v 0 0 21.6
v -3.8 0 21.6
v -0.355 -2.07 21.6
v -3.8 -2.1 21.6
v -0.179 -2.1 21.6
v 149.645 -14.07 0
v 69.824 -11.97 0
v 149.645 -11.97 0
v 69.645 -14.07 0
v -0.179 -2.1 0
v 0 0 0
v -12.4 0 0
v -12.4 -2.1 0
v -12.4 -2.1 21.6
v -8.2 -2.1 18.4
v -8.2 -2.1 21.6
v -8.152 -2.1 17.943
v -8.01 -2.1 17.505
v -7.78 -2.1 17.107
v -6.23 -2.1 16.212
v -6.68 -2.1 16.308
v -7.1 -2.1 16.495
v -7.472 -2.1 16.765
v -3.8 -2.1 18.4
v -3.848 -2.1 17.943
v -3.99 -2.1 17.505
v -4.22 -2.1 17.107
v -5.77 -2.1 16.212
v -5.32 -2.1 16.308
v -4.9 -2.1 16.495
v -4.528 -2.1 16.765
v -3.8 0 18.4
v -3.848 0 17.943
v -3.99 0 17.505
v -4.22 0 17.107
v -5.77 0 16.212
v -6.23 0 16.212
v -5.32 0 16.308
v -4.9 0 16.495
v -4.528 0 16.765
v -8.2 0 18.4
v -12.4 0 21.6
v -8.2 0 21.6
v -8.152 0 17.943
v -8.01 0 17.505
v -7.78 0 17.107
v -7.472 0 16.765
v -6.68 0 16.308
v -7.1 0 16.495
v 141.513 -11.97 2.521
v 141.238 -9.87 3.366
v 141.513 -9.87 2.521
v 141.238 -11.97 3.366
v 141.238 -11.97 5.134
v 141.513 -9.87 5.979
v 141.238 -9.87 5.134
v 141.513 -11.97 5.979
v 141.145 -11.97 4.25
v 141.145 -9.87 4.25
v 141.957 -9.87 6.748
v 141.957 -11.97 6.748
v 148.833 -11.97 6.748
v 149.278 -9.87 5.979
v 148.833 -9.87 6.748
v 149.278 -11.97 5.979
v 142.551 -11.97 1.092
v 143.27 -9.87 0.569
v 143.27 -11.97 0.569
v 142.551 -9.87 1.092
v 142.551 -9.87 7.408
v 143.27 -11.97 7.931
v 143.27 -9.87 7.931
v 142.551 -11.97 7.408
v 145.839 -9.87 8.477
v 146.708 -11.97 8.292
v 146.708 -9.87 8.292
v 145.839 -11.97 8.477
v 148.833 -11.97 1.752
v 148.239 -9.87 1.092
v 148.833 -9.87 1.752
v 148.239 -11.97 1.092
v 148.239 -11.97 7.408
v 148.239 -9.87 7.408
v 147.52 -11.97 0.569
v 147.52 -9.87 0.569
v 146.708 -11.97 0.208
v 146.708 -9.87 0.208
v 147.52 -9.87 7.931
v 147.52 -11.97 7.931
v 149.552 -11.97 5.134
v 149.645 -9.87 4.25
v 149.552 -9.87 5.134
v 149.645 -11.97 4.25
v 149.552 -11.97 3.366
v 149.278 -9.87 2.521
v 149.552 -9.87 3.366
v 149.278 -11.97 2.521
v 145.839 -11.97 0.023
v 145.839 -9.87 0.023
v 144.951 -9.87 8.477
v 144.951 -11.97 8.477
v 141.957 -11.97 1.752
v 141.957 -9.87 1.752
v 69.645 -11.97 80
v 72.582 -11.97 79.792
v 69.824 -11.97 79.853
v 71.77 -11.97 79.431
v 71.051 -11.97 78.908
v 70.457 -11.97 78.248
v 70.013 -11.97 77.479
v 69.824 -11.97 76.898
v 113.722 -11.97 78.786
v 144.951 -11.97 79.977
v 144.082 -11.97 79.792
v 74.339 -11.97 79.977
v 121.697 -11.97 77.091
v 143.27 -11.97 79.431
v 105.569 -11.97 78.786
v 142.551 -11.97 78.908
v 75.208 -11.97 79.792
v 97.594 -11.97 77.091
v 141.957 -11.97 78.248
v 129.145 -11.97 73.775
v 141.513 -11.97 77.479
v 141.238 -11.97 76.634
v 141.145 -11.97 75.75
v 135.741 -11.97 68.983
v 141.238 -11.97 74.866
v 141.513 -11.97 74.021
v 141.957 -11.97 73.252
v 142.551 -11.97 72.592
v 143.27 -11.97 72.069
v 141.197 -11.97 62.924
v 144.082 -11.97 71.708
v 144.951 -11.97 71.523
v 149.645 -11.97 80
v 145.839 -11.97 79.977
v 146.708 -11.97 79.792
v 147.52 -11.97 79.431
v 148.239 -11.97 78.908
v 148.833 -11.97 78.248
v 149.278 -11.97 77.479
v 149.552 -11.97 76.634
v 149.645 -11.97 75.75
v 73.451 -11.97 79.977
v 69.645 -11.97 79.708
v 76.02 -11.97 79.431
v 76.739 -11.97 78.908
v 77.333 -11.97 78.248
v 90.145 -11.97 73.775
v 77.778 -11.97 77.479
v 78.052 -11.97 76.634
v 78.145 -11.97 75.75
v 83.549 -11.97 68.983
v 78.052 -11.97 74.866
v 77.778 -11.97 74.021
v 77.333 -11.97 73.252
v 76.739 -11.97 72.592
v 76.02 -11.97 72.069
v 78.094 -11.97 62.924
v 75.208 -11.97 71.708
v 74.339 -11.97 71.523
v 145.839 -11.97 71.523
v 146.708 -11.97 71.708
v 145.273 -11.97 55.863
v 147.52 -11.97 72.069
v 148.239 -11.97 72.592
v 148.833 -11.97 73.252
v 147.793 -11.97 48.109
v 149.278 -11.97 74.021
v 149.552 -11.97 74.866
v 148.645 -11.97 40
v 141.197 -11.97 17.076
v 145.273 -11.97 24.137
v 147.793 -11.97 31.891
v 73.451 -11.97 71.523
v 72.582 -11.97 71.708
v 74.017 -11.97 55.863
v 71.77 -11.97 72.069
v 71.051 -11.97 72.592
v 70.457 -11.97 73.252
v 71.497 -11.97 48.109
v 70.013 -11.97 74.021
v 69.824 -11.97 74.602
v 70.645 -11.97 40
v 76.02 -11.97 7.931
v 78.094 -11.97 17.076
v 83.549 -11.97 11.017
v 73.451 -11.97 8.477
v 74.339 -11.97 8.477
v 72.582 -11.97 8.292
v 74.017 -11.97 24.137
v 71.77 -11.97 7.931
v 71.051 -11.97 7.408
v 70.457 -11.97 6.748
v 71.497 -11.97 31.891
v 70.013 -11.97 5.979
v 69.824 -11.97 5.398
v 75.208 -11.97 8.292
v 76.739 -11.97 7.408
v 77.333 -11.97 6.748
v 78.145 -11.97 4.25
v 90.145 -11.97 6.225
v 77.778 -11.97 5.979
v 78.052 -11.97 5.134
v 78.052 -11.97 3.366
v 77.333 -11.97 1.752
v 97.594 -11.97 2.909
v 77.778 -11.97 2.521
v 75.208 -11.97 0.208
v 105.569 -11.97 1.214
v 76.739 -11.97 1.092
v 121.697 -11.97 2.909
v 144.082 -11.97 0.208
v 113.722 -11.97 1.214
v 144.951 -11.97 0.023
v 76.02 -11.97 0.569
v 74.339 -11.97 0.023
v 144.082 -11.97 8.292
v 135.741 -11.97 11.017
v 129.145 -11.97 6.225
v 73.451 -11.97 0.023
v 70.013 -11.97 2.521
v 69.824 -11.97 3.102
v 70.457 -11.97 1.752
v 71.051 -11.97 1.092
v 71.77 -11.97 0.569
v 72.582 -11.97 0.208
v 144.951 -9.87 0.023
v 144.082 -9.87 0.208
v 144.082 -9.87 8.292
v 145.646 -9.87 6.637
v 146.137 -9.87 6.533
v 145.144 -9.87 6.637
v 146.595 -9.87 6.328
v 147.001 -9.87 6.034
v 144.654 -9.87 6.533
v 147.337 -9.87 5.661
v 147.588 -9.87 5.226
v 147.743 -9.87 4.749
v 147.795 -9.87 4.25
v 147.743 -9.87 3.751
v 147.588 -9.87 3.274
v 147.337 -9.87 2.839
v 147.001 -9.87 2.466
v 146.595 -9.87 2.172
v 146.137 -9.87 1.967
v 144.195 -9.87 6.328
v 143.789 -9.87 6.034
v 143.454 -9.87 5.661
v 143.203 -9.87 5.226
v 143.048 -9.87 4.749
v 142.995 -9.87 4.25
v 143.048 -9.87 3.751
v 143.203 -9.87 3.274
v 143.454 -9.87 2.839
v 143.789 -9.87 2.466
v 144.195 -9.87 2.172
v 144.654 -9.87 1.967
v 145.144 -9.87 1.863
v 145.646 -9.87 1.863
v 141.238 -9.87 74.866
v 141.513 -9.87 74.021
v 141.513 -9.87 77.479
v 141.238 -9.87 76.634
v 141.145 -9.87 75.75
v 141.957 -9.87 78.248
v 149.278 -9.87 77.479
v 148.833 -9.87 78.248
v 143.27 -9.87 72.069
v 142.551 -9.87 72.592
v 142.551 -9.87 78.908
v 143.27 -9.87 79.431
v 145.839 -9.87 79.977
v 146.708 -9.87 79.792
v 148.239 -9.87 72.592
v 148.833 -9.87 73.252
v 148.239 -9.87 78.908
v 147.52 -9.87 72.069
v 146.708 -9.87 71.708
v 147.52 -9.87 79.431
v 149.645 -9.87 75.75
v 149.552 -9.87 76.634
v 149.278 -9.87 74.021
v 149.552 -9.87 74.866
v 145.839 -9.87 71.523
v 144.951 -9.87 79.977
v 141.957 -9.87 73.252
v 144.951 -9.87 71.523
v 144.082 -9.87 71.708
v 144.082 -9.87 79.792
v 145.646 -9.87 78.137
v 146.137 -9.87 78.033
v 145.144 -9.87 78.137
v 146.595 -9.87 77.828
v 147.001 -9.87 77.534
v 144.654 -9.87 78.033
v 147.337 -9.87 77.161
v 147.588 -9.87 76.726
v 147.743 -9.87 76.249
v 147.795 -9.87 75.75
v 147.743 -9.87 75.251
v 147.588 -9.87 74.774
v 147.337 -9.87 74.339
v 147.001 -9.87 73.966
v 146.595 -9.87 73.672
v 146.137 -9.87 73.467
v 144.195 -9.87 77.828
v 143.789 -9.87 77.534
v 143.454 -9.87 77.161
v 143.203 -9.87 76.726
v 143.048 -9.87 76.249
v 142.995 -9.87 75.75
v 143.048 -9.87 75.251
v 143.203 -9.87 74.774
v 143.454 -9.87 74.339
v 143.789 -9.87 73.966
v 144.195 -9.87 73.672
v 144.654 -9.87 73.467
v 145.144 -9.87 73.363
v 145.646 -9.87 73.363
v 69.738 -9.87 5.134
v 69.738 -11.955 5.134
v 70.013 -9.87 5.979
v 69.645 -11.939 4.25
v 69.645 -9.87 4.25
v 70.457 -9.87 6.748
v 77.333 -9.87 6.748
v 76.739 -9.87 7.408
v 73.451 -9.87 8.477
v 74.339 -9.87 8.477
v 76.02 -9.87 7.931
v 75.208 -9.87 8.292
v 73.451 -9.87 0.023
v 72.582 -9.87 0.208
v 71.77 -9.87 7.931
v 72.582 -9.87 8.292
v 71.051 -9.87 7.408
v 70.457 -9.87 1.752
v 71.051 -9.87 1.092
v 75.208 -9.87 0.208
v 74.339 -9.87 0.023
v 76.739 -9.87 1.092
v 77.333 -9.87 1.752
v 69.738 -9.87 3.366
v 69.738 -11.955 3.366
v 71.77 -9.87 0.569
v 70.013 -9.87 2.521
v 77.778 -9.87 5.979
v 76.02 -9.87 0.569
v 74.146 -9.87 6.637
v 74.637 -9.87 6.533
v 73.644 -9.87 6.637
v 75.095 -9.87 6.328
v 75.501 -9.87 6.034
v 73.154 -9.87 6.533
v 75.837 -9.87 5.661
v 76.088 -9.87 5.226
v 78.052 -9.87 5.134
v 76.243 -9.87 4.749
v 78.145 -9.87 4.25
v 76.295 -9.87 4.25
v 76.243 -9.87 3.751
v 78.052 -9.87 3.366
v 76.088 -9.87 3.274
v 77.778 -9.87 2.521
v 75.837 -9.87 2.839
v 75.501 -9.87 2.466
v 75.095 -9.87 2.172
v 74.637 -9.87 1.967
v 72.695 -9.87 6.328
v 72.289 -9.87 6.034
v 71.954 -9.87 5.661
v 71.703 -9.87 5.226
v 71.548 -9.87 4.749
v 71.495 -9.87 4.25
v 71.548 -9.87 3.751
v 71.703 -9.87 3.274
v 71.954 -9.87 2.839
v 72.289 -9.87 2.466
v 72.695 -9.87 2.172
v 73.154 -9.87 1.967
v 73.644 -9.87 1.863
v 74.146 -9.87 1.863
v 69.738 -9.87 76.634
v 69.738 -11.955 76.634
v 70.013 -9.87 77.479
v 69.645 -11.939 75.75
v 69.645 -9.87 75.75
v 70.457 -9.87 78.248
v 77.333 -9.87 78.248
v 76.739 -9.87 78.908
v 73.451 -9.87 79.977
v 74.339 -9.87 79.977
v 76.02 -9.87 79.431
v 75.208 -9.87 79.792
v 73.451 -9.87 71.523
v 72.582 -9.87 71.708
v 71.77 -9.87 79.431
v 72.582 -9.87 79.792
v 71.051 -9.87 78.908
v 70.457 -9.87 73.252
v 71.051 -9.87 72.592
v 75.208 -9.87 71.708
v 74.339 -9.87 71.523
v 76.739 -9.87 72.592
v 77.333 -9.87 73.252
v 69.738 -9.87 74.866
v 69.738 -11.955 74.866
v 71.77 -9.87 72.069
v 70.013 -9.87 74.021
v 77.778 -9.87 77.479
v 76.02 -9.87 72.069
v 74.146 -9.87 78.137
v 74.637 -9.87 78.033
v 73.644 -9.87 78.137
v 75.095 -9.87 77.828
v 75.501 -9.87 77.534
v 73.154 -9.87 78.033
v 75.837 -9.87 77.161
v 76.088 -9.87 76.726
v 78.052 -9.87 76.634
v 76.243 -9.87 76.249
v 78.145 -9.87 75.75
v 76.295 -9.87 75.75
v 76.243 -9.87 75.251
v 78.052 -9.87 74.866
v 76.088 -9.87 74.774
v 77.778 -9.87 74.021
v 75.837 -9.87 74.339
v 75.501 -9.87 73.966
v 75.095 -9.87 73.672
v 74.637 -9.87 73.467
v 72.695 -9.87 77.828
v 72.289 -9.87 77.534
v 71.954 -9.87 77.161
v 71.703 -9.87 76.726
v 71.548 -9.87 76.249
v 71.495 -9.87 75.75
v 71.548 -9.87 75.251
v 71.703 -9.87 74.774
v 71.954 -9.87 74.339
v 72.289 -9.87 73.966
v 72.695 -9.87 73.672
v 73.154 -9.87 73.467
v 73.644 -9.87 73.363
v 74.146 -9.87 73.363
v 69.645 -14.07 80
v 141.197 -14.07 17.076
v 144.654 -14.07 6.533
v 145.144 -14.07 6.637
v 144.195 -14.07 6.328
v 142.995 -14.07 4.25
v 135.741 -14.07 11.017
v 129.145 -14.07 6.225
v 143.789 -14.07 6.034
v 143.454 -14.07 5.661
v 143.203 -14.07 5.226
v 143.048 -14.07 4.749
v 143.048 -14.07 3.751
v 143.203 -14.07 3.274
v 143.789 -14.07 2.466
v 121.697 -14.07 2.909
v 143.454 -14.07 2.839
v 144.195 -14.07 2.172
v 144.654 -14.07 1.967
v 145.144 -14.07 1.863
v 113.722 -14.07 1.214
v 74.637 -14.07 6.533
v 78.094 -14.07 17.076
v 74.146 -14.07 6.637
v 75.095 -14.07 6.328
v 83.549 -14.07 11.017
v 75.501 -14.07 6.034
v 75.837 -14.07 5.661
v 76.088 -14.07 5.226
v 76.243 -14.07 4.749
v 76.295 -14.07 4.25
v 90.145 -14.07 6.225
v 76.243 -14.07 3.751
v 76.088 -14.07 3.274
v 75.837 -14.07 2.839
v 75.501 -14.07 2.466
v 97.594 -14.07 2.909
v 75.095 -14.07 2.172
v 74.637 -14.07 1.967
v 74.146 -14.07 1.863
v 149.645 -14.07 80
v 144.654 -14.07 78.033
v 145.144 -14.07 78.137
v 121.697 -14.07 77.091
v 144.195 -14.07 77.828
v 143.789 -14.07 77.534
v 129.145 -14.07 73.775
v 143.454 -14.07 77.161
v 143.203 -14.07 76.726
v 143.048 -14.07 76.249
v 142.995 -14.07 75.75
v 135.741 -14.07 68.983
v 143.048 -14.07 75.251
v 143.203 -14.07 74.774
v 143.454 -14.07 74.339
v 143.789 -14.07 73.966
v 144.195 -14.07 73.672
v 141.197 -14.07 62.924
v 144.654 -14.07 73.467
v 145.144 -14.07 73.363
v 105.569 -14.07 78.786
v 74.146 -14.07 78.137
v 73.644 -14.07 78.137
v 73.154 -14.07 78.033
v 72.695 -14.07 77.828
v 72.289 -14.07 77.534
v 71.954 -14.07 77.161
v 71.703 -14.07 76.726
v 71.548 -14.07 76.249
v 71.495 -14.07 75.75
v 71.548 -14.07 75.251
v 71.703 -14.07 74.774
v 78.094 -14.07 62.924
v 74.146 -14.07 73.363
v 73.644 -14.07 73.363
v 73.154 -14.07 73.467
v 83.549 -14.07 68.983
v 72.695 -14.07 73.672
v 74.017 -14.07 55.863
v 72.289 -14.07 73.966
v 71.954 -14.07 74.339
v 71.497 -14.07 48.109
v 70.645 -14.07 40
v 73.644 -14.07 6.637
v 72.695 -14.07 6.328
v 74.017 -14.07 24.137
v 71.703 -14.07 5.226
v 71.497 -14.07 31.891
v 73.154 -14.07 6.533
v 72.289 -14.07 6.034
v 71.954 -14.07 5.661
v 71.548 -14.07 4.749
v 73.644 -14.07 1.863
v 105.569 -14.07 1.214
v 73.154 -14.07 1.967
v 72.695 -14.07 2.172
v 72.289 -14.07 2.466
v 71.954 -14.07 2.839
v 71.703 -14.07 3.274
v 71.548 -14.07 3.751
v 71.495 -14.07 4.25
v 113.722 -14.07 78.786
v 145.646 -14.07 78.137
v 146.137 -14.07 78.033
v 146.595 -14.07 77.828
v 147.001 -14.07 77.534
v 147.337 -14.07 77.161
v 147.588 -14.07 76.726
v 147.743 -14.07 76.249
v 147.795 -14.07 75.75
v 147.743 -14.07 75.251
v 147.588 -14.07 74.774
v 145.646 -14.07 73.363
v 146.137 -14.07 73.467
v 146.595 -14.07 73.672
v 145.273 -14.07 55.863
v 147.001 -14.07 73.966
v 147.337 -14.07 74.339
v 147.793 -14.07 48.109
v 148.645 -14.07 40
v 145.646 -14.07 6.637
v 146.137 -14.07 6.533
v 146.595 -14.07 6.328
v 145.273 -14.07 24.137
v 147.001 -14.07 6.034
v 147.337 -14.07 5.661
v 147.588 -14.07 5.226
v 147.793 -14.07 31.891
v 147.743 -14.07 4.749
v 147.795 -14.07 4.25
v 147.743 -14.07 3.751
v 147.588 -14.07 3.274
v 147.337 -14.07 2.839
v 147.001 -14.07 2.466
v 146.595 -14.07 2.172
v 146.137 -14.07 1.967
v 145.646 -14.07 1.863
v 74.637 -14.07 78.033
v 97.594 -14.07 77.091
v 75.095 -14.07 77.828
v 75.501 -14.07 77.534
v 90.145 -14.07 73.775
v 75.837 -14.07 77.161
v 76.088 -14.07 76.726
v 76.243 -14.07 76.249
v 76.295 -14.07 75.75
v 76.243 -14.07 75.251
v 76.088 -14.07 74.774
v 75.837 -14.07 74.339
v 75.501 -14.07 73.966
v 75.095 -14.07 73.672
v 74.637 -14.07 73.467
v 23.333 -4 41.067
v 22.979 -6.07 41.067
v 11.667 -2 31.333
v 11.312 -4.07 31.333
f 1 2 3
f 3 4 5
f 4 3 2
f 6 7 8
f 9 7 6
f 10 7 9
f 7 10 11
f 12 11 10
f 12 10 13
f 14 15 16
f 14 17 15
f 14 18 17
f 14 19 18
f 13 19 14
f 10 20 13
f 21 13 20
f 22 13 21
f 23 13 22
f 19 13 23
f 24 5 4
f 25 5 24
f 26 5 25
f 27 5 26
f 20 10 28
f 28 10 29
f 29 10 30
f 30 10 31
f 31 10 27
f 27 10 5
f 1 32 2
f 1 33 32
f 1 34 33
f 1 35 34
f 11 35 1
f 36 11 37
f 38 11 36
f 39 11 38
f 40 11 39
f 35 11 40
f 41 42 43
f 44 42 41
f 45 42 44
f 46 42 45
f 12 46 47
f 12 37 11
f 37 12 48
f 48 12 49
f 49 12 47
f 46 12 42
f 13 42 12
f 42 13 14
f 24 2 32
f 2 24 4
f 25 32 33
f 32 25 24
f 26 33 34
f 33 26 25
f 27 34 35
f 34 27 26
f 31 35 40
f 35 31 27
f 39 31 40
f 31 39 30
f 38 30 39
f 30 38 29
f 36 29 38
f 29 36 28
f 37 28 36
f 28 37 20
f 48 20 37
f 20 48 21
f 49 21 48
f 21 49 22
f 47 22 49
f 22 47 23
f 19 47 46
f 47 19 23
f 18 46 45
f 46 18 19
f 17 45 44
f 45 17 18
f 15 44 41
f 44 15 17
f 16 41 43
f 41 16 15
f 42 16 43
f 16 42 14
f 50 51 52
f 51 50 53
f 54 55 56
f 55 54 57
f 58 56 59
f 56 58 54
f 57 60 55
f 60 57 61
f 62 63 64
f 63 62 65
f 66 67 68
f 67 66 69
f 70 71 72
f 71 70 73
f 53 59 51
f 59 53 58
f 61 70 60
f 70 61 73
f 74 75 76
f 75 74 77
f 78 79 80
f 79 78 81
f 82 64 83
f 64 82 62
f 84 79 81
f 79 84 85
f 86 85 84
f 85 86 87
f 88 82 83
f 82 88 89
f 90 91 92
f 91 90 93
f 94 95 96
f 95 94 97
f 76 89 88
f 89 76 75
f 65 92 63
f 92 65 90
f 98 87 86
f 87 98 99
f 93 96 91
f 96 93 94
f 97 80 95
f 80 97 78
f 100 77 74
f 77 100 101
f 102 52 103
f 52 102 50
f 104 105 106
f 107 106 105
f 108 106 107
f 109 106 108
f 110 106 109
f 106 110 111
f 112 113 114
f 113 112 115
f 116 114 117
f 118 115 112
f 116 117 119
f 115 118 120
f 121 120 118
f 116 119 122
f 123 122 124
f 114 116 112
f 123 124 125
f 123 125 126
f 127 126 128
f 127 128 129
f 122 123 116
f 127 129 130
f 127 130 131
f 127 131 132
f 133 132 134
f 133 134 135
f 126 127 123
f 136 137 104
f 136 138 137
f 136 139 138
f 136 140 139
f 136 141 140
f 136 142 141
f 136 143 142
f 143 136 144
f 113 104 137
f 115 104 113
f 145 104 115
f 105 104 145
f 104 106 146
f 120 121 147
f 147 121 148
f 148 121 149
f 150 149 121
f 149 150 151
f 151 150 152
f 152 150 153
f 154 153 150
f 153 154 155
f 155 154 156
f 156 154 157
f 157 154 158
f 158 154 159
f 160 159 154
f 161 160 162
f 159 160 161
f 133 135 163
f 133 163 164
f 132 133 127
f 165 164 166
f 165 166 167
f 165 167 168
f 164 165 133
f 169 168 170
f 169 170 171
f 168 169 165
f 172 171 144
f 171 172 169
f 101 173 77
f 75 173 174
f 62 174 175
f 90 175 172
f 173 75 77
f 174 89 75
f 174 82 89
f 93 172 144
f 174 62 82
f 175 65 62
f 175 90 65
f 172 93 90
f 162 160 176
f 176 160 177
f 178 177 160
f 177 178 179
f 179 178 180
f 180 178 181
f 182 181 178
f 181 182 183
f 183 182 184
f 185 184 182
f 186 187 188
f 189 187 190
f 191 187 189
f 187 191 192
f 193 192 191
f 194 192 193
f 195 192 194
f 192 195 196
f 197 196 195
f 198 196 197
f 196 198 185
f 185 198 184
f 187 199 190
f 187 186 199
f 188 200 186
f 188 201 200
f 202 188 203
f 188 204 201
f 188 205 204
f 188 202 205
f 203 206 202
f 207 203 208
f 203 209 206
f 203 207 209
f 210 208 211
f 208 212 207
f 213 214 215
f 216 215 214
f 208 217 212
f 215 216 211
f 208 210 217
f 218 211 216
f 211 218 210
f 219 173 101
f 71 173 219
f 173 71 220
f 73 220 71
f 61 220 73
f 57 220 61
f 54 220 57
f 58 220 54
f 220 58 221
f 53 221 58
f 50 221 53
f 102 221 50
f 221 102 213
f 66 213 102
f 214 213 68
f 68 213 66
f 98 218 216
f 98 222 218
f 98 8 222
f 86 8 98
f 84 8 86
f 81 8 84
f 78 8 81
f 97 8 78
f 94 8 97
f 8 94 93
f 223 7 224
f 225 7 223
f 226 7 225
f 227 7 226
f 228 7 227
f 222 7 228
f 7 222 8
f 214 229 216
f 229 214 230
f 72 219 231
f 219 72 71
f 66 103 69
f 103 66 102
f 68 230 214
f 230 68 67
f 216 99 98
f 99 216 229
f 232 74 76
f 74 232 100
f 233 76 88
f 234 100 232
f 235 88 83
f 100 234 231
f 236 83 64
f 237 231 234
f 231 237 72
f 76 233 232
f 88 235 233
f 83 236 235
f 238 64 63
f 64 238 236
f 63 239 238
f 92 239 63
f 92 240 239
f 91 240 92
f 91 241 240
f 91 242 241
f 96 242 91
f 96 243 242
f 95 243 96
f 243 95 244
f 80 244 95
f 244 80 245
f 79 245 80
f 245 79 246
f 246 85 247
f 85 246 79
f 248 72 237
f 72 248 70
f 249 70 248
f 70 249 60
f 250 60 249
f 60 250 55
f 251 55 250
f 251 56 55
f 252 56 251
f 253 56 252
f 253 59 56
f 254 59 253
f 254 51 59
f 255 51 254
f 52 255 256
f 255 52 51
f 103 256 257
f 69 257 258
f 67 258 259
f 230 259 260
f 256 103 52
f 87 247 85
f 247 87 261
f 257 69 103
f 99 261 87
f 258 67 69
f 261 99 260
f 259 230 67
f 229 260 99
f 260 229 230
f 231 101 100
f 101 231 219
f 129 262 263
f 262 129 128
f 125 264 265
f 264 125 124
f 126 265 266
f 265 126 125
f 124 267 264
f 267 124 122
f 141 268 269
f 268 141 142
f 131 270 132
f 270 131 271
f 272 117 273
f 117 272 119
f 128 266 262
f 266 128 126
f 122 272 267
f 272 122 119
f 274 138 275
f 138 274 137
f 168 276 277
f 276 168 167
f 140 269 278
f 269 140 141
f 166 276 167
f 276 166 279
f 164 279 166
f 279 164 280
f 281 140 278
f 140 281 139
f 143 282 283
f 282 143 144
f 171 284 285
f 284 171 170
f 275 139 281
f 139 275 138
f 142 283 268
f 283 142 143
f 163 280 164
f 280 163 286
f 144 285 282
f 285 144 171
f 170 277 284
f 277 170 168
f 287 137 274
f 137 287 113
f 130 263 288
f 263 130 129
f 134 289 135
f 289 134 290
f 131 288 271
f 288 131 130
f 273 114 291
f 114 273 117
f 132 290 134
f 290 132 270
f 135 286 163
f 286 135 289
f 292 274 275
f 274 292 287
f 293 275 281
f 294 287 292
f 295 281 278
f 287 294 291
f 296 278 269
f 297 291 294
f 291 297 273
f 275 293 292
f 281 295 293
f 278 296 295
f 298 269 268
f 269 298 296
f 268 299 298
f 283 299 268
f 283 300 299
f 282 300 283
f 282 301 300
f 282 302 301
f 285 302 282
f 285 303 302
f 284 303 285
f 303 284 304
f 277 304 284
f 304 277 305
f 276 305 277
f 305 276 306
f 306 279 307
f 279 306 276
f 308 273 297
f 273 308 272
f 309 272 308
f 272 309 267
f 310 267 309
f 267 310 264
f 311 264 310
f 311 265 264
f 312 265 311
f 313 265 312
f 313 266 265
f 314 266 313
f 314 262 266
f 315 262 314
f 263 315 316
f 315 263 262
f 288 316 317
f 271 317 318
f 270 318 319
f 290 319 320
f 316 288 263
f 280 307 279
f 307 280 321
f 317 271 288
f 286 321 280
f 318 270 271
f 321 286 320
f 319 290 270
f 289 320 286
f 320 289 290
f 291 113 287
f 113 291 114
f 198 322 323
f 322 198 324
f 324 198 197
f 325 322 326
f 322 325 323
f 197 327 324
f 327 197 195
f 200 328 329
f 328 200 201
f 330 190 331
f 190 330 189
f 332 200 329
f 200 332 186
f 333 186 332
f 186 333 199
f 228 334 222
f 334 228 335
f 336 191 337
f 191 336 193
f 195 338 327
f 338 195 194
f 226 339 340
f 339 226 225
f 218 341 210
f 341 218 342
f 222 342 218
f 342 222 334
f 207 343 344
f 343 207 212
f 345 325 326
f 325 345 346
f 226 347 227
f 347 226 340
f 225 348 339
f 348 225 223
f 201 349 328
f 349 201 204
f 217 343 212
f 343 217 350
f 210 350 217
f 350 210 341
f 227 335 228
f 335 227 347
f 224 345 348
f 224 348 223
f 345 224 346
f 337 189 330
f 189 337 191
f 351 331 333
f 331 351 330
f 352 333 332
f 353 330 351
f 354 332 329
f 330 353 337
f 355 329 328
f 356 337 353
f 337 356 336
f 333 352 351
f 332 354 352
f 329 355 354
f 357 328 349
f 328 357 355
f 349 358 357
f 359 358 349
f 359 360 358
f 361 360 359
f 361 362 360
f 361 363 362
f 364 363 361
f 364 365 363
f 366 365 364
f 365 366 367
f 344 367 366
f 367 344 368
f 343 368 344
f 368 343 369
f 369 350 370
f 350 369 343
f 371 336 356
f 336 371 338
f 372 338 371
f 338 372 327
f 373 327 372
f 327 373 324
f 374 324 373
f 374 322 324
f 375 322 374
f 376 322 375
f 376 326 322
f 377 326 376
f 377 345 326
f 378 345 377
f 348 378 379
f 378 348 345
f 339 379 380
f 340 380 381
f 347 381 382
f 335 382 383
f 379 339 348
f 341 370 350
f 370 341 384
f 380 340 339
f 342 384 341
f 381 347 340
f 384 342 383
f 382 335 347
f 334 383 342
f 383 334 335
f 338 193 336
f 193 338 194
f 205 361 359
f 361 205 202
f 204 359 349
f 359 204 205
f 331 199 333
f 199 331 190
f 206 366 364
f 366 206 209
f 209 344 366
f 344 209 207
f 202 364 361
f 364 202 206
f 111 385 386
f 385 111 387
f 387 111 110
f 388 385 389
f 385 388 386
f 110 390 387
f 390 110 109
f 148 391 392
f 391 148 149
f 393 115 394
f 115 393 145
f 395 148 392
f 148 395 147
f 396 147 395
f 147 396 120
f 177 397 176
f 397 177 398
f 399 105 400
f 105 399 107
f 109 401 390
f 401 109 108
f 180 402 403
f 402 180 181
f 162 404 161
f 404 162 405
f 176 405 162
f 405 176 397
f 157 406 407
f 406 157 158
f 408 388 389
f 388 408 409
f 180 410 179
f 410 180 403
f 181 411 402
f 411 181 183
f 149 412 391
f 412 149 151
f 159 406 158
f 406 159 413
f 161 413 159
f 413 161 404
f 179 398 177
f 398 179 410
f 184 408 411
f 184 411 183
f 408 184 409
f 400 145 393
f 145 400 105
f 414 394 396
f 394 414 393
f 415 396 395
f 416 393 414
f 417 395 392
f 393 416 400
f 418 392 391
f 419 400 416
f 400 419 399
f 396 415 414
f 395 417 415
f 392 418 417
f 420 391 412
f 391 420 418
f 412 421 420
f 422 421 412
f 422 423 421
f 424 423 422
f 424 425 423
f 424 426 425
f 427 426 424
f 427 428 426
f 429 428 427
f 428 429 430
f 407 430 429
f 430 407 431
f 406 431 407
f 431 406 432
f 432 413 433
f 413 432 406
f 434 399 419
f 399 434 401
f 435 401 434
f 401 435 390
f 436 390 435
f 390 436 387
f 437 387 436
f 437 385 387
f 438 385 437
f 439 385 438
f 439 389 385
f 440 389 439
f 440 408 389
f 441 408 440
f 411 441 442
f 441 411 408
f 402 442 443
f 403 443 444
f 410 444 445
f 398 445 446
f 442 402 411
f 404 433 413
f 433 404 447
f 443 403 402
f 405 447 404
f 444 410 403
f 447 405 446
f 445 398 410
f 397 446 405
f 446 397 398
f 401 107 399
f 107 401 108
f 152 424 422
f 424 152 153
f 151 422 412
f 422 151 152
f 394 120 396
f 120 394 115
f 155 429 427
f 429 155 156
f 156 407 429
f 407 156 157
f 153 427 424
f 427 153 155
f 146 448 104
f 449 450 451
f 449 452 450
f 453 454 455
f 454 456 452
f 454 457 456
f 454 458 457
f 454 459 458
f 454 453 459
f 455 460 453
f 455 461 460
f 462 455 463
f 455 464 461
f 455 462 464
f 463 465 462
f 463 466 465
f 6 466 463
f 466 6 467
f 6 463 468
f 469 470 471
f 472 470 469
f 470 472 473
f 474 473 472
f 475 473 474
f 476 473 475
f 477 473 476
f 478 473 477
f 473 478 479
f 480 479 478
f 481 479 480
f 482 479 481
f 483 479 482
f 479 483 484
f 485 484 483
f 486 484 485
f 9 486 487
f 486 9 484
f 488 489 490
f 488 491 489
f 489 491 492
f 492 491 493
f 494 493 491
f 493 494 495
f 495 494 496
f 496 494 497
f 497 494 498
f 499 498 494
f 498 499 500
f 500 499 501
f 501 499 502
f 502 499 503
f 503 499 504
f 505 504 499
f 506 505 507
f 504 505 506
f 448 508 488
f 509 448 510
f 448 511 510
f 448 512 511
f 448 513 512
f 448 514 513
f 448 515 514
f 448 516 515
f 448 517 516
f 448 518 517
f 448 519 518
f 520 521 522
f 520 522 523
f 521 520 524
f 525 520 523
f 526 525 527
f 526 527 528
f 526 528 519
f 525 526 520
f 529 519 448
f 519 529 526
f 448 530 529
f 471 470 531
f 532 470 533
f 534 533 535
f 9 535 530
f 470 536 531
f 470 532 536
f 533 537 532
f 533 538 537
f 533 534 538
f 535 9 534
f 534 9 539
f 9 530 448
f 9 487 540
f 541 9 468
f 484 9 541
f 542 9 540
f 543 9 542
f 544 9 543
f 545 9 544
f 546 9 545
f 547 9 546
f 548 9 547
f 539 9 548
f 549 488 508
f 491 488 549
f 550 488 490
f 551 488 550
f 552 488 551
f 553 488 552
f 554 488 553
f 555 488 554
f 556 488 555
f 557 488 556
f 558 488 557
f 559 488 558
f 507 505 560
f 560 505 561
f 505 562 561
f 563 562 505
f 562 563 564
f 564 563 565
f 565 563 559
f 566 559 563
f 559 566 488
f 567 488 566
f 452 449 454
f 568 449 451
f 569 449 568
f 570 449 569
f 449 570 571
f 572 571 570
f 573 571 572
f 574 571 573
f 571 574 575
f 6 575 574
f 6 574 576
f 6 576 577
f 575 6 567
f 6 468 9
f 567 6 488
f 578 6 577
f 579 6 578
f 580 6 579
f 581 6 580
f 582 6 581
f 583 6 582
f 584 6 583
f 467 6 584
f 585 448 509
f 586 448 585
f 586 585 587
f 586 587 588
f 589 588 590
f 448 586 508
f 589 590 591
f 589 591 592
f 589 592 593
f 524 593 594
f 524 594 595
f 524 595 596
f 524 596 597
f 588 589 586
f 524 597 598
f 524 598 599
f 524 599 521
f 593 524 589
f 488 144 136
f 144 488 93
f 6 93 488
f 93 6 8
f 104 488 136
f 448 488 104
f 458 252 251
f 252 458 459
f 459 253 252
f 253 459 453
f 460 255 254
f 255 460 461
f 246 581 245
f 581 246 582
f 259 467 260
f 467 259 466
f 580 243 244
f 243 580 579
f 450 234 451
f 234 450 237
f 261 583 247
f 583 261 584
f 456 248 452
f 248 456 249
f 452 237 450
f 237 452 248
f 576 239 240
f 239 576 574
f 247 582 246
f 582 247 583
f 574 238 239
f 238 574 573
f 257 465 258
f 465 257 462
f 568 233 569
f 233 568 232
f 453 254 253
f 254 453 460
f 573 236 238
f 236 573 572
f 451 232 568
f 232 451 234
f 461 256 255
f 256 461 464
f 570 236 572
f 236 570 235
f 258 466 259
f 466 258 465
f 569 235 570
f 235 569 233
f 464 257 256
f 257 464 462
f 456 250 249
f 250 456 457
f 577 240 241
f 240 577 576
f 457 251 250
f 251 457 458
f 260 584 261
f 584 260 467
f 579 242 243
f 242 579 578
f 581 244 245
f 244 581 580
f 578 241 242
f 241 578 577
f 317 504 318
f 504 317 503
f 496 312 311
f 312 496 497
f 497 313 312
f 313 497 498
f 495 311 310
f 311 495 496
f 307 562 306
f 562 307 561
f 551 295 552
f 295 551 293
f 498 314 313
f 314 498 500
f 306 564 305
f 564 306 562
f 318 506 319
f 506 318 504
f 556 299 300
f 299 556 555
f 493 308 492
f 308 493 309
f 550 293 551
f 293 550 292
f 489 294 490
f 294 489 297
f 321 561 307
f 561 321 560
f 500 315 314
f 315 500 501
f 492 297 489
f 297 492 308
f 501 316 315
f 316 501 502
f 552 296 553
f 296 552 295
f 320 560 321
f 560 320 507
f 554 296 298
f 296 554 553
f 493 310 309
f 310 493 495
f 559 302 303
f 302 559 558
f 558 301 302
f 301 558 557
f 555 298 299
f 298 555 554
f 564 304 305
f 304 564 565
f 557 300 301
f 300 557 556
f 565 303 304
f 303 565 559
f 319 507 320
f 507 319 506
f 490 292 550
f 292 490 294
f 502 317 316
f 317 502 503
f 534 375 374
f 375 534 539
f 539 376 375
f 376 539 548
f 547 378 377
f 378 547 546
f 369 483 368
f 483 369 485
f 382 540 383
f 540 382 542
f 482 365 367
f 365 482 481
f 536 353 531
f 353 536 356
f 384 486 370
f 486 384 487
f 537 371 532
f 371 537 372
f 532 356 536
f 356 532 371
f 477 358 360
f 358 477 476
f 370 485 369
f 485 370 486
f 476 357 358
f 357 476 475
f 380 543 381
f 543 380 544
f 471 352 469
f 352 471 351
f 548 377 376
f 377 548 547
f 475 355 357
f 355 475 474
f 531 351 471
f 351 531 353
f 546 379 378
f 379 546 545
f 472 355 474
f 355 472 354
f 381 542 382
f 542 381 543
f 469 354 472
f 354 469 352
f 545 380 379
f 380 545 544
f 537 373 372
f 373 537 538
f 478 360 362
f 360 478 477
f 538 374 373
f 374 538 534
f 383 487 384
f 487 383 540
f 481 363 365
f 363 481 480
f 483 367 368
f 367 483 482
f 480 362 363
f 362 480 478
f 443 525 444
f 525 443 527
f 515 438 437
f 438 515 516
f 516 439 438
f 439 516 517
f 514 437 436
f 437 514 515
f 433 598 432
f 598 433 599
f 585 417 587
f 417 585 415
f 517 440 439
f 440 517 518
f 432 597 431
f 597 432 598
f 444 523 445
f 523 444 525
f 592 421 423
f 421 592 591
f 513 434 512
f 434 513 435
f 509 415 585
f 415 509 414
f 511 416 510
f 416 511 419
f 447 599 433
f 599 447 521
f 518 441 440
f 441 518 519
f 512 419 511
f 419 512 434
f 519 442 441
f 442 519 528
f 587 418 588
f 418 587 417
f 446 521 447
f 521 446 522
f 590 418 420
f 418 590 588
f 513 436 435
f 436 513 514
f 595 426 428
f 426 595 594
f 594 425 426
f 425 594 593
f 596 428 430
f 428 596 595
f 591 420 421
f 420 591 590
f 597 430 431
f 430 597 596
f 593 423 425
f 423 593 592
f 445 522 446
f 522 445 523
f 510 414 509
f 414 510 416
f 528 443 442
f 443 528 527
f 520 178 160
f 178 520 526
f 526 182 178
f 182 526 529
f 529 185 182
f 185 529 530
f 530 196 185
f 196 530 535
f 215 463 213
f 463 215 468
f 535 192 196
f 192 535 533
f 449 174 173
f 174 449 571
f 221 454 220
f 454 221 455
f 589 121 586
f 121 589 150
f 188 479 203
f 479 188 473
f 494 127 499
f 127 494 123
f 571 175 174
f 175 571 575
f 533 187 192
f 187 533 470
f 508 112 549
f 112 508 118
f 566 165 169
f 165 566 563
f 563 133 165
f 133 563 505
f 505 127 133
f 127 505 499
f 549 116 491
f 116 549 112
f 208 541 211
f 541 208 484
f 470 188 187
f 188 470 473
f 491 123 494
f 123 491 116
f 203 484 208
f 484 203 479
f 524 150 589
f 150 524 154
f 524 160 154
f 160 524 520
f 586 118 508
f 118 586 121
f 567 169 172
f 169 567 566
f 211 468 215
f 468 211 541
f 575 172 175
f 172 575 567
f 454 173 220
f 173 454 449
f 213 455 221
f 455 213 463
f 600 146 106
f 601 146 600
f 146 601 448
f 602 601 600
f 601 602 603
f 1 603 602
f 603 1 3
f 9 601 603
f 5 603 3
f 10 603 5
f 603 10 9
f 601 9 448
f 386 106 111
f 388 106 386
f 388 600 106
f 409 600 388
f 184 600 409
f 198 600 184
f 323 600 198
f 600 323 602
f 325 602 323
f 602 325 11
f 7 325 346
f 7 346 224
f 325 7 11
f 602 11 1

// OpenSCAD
// file: ../finger/finger.scad
// PC case Finger (slot cover)
// Author: JayEye <jayeye@gmail.com>
//
// For the latest version, look in
// https://github.com/jayeye/jum/tree/master/src/scad/finger
//
// The following dimensions are taken from
// http://www.lo-tech.co.uk/w/images/0/0b/RAM-and-EMS-Board-Slot-Bracket-r01.png
// All distances are in millimeters.
//
//
// Body, looking from the outside.
//                                                        B.-----.A
//                                                        /      |
//                                                       /       |
//            D.-------------------//-------------------'C       |
//            /                                                  |
//  F.-------'E                                                  |
//   |                                                           |
//   |                                                           |
//  G`-------.H                                          K.------'L
//            \                                          /
//            I`-------------------//-------------------'J
//
// Horizontal distances:
// AB: 2.8
// AC: 6.1
// AG: 120
// AH: 112.8
// AJ: 8.5
// AK: 5.7
//
// Vertical distances:
// AL: 18.8
// LJ: 2.8
// FG: 10.2
// JD: 18.3

module finger_front() {
  u = (18.3 - 10.2) / 2;

  A = [0, 0];
  B = A + [-2.8, 0];
  L = A + [0, -18.8];
  K = L + [-5.7, 0];
  J = [-8.5, K[1] - 2.8];
  H = [-112.8, J[1] + u];
  I = [H[0] + u, J[1]];
  G = [-120, H[1]];
  F = G + [0, 10.2];
  E = [H[0], F[1]];
  D = [I[0], J[1] + 18.3];
  C = A + [-6.1, D[1]];
  B = A + [-2.8, 0];

  Fa = F + [0, -1]; // chamfer the corners!
  Fb = F + [1, 0];

  Ga = G + [0, 1];
  Gb = G + [1, 0];

  polygon(points=[A, B, C, D, E, Fb, Fa, Ga, Gb, H, I, J, K, L],
          paths=[[0, 1, 2, 3, 4, 5, 6, 7, 8, 9, 10, 11, 12, 13]]);
}


// Tab, looking from above:
//
//  P.------.Q   V.---.M
//   |      |     |   |
//   |      |     |   |
//   |      R  S  T   |
//   |       \___/    |
//   |                |
//   |                |
//   |                |
//   |                |
//  O`----------------'N
//
// 
// Horizontal distances:
// PS: 6.4
// ON: 11.5
// QV: 4.4
//
// Vertical distances:
// MS: 3.2
// MN: 18.8
//
// S is the center of a semicircle.

module finger_top() {
  r = 4.4 / 2;

  M = [0, 0];
  N = M + [0, -18.8];
  O = N + [-11.5, 0];
  P = [O[0], 0];
  S = P + [6.4, -3.2];
  R = S + [-r, 0];
  T = S + [r, 0];
  Q = [R[0], 0];
  V = [T[0], 0];

  difference() {
    polygon(points=[M, N, O, P, Q, R, T, V],
            paths=[[0, 1, 2, 3, 4, 5, 6, 7]]);
    translate(S) circle(r=r);
  }
}

module finger_full(finger_thickness=1) {
  color("cyan")
    linear_extrude(height=finger_thickness) 
      finger_front();
  color("magenta")
    translate([0, 0, finger_thickness])
      rotate(90, [0, 1, 0])
        linear_extrude(height=finger_thickness)
          finger_top();
  color("yellow")
    scale([1, -1, 1])
      cube([finger_thickness, 18.8, finger_thickness]);
}

finger_full();
// main file
$fn=30;
use <../finger/finger.scad>

// Cooling fan for cards, supported from a finger in an empty slot.
// Author: JayEye <jayeye@gmail.com>
//
// For the latest version, look in
// https://github.com/jayeye/jum/tree/master/src/scad/fingerfan

finger_fan_bracket();
module finger_fan_bracket() {
  fan_size = 80;
  fan_hole_distance = 71.5;
  finger_thickness = .9;    // I print at .15 z-resolution, so I want these
  bracket_thickness = 2.1;  // to be multiples of Δz.
  bracket_fan_distance_from_case = 110 - fan_size / 2;
  bracket_fan_distance_from_cards = 12;

  bracket_phi = atan2(bracket_fan_distance_from_cards,
                      bracket_fan_distance_from_case);
  echo(bracket_phi);
  bracket_hypotenuse = sqrt(bracket_fan_distance_from_cards *
                            bracket_fan_distance_from_cards +
                            bracket_fan_distance_from_case * 
                            bracket_fan_distance_from_case);
  finger_full_z = (18.8 + 2.8);  // AL + LJ
  finger_full_x = 11.5;  // NO

    // finger pad
  color("blue") {
    union() {
      translate([-finger_thickness, 0, finger_full_z]) {
        rotate(90, [1, 0, 0]) {
          linear_extrude(height=bracket_thickness) finger_top();
        }
      }
      scale([-1, -1, 1]) {
        cube([finger_thickness, bracket_thickness, finger_full_z]);
        cube([finger_thickness + finger_full_x, bracket_thickness, finger_full_z/2]);
      }
    }
  }  
    // actual bracket
  rotate((90 - bracket_phi)) {
    translate([-bracket_thickness, 0, 0]) {
      rotate(90, [1, 0, 0]) {
        union() {
          color("green") {
            linear_extrude(height=bracket_hypotenuse,
                           scale=[1, fan_size / finger_full_z]) {
              square([ bracket_thickness, finger_full_z]);
            }
          }
          color("red") {
            translate([0, fan_size, bracket_hypotenuse]) {
              rotate(bracket_phi, [0, 1, 0]) {
                translate([0, -fan_size/2, fan_size/2]) {
                  rotate(90, [0, 1, 0]) {
                    fan_frame(frame_thickness=bracket_thickness);
                  }
                }
              }
            }
          }
        }
      }
    }
  }

  // show, but probably don't print, the actual finger
  %translate([0, finger_thickness, finger_full_z]) {
    rotate(-90, [0, 1, 0]) {
      rotate(-90) {
        finger_full(finger_thickness);
      }
    }
  }  
}

module fan_frame(
  frame_thickness=1,
  fan_size=80,
  hole_distance=71.5,
  hole_diameter=4.8,  // this is the hole of the *bracket*, not the fan itself!
) {
  stud_radius = (fan_size - hole_distance) / 2;
  difference() {
    // ++++++++
    union() {
      translate([-fan_size / 2, -fan_size / 2, 0]) {
        cube([fan_size, fan_size, frame_thickness]);
      }
      for (x = [-hole_distance / 2, hole_distance / 2]) {
        for (y = [-hole_distance / 2, hole_distance / 2]) {
          translate([x, y, frame_thickness]) {
            cylinder(r=stud_radius, h=frame_thickness);
          }
        }
      }
    }
    // --------
    for (x = [-hole_distance / 2, hole_distance / 2]) {
      for (y = [-hole_distance / 2, hole_distance / 2]) {
        translate([x, y, 0]) {
          cylinder(r=(hole_diameter / 2), h=(2 * frame_thickness));
        }
      }
    }
    cylinder(r=((fan_size - 2) / 2), h = frame_thickness);
  }
}
